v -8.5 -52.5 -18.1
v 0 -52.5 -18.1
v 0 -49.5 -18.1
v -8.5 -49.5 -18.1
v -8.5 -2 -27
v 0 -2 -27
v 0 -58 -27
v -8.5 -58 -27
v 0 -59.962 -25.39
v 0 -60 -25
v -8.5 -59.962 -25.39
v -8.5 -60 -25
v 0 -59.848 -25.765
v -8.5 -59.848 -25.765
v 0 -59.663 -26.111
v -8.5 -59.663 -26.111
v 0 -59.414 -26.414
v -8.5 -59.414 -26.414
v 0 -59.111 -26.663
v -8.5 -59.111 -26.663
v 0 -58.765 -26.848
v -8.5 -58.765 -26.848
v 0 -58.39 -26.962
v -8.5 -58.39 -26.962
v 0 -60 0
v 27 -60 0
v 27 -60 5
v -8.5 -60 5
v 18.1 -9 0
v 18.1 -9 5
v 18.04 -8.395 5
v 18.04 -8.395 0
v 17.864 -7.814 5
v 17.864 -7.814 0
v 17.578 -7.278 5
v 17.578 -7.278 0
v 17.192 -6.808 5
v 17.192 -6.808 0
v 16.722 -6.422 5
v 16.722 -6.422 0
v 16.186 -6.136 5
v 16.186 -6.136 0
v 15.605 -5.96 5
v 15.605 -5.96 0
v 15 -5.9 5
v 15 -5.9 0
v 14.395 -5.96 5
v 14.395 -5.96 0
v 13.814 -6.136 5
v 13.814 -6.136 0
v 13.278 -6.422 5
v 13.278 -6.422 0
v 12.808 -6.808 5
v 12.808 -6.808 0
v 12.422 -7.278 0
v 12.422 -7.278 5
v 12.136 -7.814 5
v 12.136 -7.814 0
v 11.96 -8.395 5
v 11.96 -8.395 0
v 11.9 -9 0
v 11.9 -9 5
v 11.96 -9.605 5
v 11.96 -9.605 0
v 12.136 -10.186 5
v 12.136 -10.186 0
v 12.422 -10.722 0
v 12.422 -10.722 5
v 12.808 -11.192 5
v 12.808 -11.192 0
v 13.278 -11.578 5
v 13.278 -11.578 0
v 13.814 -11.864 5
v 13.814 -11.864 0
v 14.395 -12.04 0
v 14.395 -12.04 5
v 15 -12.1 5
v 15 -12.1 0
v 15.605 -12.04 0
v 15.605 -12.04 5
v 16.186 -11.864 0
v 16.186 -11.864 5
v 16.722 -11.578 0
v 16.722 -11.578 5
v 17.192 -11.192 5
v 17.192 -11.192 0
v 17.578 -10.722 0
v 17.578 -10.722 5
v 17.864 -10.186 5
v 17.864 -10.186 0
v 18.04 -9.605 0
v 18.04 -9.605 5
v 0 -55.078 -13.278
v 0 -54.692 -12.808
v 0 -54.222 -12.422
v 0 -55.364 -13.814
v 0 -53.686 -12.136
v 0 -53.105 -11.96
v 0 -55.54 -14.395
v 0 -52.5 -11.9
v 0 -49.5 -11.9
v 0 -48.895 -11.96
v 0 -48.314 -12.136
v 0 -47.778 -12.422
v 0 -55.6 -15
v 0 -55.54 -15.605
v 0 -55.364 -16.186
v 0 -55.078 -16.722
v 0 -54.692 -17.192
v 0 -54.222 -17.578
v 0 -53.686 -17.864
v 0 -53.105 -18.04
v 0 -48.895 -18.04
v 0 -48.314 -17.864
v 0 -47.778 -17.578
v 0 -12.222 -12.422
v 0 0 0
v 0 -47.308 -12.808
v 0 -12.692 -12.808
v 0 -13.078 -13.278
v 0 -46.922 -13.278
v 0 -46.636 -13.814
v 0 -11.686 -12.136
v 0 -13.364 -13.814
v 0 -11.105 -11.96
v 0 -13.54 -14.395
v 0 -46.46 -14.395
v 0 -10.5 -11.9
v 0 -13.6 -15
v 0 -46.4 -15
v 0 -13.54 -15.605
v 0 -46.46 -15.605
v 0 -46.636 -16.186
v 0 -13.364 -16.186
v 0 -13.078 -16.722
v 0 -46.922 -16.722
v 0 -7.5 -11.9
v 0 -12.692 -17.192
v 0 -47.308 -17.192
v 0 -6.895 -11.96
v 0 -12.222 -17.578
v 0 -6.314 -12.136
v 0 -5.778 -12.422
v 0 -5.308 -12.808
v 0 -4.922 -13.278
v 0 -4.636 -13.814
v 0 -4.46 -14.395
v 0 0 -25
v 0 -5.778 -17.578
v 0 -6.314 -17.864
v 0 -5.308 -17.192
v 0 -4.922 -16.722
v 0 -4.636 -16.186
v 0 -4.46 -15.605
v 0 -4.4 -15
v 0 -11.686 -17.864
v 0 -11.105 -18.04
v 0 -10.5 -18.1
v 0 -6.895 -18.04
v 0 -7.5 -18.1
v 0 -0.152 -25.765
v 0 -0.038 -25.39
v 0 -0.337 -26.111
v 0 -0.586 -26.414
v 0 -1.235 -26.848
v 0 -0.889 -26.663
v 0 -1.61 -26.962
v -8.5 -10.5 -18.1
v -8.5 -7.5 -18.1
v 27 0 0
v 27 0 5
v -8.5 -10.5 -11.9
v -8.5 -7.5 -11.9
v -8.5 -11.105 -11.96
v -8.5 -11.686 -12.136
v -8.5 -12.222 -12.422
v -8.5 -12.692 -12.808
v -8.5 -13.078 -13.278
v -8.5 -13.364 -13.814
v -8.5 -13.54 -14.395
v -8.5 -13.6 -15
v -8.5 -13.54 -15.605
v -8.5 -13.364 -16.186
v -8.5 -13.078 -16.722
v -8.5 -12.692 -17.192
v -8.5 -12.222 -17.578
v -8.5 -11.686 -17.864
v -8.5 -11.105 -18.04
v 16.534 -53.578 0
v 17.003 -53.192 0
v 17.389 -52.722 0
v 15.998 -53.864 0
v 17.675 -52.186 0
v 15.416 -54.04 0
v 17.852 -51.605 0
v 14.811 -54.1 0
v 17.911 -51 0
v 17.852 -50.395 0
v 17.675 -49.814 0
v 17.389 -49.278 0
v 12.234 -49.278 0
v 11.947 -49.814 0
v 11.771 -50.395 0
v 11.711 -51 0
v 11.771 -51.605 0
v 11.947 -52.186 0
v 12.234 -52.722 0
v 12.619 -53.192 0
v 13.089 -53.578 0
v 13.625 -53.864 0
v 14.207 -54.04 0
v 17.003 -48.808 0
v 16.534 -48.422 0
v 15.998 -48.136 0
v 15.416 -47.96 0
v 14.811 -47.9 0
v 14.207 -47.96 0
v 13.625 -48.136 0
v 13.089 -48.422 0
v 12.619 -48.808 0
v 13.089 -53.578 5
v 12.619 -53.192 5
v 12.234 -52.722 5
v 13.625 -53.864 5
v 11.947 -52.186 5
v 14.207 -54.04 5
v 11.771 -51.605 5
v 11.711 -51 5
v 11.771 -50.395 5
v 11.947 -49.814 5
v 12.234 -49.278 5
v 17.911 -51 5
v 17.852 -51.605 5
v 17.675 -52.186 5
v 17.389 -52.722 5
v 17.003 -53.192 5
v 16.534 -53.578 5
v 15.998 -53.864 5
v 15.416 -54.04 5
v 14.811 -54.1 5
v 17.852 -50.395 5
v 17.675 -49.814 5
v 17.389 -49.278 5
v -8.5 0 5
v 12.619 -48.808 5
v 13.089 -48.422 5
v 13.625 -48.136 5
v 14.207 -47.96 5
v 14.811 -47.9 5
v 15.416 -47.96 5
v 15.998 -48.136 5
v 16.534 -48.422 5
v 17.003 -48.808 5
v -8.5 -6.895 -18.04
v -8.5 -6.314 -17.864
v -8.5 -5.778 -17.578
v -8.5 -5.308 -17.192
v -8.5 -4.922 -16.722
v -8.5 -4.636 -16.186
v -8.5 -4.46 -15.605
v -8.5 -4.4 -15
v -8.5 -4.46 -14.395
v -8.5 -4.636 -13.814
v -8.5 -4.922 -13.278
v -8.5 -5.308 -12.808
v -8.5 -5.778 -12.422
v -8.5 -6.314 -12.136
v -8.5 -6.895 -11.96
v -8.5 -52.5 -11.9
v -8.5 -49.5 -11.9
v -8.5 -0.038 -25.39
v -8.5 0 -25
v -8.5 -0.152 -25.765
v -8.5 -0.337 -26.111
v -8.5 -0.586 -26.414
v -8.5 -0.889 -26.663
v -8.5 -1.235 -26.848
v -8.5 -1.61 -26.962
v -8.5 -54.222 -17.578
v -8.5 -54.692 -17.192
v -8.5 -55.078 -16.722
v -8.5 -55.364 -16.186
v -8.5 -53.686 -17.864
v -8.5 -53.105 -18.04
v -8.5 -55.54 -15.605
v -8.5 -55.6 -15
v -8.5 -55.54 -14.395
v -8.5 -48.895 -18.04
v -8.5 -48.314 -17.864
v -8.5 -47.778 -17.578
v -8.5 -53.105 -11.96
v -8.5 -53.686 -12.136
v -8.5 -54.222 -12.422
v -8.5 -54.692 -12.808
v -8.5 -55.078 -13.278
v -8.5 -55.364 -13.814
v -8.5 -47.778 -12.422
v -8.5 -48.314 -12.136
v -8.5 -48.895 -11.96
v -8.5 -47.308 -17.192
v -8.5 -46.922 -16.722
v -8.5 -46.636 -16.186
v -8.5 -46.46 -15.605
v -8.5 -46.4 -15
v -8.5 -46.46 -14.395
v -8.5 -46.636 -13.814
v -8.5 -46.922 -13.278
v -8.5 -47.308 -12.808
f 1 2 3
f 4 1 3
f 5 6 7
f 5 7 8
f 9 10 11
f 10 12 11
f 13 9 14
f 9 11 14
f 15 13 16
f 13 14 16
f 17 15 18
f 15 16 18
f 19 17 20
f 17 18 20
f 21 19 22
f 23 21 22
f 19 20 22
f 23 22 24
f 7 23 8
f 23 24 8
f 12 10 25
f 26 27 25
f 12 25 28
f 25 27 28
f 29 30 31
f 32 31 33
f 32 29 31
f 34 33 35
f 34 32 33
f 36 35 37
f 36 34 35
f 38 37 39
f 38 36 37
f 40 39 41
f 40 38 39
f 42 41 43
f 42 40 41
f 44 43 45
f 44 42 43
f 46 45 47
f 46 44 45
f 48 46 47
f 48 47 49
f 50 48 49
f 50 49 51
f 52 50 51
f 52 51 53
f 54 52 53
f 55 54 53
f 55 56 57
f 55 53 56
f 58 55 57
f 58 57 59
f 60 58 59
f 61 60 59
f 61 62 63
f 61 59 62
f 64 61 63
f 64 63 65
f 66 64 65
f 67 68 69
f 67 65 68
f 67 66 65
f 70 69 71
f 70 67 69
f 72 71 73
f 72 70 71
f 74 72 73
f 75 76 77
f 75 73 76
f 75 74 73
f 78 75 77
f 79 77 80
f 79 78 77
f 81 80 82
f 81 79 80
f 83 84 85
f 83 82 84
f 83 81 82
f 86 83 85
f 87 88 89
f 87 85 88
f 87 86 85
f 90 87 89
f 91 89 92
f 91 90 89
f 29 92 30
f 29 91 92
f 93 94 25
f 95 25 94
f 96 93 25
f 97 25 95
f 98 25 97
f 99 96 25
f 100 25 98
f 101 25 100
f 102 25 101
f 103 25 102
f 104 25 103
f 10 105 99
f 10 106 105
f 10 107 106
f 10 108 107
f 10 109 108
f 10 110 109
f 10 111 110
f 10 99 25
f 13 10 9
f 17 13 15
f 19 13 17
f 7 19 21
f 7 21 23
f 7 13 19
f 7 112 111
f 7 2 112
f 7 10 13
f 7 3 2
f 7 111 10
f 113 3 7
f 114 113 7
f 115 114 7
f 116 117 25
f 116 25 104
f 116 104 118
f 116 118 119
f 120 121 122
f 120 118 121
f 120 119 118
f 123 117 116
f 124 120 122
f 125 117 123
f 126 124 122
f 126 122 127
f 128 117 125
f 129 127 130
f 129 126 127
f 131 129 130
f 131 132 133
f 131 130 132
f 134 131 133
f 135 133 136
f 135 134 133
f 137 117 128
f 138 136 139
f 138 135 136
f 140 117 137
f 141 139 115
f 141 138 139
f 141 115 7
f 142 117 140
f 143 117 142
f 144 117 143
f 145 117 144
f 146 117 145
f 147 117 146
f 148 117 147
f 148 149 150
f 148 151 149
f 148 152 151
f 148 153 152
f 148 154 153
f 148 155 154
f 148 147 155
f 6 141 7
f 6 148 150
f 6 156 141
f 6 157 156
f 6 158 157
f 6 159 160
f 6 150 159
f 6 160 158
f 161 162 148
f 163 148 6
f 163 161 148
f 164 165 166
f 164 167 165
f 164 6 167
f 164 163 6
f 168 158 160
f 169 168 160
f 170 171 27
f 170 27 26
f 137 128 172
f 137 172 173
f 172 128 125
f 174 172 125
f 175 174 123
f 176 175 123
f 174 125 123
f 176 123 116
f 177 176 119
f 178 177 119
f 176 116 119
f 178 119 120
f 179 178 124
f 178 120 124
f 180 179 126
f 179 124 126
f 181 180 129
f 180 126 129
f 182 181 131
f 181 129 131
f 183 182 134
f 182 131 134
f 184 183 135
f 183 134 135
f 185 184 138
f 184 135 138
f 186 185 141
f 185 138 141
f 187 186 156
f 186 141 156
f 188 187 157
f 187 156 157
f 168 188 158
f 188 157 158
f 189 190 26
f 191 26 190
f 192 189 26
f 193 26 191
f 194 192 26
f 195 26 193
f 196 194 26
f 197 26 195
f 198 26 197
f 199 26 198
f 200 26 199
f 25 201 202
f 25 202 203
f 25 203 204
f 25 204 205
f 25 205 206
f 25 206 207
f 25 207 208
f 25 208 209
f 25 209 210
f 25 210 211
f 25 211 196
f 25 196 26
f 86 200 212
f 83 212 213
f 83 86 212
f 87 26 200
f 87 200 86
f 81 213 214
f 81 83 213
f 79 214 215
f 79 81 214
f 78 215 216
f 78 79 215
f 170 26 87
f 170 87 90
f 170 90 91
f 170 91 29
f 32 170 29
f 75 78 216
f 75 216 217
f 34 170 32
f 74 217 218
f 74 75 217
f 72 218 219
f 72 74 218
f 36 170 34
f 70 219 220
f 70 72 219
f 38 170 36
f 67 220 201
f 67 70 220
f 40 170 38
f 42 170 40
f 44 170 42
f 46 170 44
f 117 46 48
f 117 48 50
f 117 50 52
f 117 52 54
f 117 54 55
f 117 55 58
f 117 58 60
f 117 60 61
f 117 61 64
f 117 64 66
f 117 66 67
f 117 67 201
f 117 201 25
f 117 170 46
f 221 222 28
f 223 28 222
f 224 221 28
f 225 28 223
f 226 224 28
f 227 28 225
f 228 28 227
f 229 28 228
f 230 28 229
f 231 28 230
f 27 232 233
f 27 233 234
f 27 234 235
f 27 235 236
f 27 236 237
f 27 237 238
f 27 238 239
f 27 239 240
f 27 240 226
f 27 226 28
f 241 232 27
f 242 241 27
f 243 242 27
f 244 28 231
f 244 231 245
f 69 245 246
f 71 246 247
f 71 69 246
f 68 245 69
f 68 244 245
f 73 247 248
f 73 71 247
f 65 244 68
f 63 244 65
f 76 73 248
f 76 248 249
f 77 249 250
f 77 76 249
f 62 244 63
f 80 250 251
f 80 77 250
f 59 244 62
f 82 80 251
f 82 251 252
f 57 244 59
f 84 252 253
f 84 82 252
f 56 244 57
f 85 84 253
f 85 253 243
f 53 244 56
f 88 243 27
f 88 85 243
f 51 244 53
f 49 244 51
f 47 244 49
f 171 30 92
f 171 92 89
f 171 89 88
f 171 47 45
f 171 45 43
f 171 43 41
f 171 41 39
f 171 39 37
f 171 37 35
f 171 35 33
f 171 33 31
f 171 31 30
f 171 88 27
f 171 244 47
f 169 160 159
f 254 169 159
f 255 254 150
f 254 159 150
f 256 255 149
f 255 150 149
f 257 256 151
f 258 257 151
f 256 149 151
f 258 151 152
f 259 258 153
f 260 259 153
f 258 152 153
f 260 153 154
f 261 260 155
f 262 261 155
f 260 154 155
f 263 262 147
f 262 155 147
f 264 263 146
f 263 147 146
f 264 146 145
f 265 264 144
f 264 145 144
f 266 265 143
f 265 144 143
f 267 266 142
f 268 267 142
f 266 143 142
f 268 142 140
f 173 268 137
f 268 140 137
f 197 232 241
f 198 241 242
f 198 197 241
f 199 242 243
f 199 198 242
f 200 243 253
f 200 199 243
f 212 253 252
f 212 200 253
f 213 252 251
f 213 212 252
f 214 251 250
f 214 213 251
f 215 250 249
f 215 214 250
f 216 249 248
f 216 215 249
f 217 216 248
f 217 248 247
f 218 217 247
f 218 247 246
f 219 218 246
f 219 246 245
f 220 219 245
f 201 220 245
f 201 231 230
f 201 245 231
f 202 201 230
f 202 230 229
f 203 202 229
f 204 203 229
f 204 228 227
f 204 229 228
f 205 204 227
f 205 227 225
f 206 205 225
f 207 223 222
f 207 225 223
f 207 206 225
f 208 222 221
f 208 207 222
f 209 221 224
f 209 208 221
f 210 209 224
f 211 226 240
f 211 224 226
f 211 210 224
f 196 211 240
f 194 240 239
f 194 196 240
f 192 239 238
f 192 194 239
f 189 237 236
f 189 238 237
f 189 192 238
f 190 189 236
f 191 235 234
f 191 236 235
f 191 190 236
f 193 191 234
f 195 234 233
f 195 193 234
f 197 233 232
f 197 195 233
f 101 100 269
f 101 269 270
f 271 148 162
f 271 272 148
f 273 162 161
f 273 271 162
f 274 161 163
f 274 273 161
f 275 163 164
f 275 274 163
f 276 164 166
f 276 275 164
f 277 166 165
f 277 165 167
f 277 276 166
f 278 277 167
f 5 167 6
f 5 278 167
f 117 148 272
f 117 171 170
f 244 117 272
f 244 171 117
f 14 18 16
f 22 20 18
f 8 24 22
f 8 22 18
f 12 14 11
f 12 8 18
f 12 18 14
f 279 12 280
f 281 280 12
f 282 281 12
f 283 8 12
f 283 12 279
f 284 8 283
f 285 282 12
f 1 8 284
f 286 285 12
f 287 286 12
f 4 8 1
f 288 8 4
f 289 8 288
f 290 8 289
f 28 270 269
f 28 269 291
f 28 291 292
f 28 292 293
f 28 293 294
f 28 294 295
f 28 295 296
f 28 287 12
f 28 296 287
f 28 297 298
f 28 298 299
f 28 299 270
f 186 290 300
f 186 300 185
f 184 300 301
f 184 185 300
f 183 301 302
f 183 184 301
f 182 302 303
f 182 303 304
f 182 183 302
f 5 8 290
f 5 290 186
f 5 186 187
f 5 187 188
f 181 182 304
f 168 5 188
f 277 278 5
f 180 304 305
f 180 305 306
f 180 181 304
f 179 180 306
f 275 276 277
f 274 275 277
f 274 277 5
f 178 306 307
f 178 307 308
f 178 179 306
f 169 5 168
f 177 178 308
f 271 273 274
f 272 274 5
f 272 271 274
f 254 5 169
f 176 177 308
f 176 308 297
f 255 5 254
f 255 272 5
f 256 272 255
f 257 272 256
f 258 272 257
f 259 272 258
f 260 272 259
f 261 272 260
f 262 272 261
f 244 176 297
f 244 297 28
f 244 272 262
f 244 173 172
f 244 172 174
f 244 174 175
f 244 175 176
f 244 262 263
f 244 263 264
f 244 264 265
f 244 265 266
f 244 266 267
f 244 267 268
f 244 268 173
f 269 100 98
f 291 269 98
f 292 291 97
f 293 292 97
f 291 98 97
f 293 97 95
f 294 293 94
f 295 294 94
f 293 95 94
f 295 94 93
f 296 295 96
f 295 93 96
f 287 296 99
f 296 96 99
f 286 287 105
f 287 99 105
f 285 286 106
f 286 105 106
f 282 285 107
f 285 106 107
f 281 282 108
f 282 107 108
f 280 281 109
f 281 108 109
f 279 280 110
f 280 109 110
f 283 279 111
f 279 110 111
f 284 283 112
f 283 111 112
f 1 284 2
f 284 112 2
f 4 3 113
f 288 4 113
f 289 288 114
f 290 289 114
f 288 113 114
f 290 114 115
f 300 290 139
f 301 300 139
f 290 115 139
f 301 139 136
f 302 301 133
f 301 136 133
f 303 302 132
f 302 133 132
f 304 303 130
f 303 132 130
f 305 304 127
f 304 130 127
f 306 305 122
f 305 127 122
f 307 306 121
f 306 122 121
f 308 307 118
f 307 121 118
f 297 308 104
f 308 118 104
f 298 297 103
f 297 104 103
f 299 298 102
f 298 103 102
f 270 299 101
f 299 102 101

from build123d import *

# Parameters (mm, degrees)
PAD_DEPTH         = 60
SKETCH001_R       = 3.1
POCKET_DEPTH      = 27.001
POCKET_DEPTH_BACK = -5.001
POCKET001_DEPTH   = 8.501
FILLET_R          = 2


with BuildPart() as part:
    # Sketch → Pad (new body)
    with BuildSketch(Plane.XZ):
        Polygon((-8.5, 5), (27, 5), (27, 0), (0, 0), (0, -27), (-8.5, -27), align=None)
    extrude(amount=PAD_DEPTH)

    # Sketch001 → Pocket (cut, two sides)
    with BuildSketch(Plane.XY) as pocket_sk:
        with Locations((14.811455, -51)):
            Circle(SKETCH001_R)
        with Locations((15, -9)):
            Circle(SKETCH001_R)
    extrude(amount=-POCKET_DEPTH, mode=Mode.SUBTRACT)
    extrude(pocket_sk.sketch, amount=-POCKET_DEPTH_BACK, mode=Mode.SUBTRACT)

    # Sketch002 → Pocket001 (cut, through all)
    with BuildSketch(Plane.YZ):
        with BuildLine():
            ThreePointArc((-52.5, -11.9), (-55.6, -15), (-52.5, -18.1))
            Line((-52.5, -18.1), (-49.5, -18.1))
            ThreePointArc((-49.5, -18.1), (-46.4, -15), (-49.5, -11.9))
            Line((-52.5, -11.9), (-49.5, -11.9))
        make_face()
        with BuildLine():
            ThreePointArc((-10.5, -11.9), (-13.6, -15), (-10.5, -18.1))
            Line((-10.5, -18.1), (-7.5, -18.1))
            ThreePointArc((-7.5, -18.1), (-4.4, -15), (-7.5, -11.9))
            Line((-10.5, -11.9), (-7.5, -11.9))
        make_face()
    extrude(amount=-POCKET001_DEPTH, mode=Mode.SUBTRACT)

    # Fillet
    fillet_edges = [part.edges().sort_by_distance(p)[0] for p in [
        (-4.25, -60, -27),
        (-4.25, 0, -27),
    ]]
    fillet(fillet_edges, radius=FILLET_R)


solid = part.part
